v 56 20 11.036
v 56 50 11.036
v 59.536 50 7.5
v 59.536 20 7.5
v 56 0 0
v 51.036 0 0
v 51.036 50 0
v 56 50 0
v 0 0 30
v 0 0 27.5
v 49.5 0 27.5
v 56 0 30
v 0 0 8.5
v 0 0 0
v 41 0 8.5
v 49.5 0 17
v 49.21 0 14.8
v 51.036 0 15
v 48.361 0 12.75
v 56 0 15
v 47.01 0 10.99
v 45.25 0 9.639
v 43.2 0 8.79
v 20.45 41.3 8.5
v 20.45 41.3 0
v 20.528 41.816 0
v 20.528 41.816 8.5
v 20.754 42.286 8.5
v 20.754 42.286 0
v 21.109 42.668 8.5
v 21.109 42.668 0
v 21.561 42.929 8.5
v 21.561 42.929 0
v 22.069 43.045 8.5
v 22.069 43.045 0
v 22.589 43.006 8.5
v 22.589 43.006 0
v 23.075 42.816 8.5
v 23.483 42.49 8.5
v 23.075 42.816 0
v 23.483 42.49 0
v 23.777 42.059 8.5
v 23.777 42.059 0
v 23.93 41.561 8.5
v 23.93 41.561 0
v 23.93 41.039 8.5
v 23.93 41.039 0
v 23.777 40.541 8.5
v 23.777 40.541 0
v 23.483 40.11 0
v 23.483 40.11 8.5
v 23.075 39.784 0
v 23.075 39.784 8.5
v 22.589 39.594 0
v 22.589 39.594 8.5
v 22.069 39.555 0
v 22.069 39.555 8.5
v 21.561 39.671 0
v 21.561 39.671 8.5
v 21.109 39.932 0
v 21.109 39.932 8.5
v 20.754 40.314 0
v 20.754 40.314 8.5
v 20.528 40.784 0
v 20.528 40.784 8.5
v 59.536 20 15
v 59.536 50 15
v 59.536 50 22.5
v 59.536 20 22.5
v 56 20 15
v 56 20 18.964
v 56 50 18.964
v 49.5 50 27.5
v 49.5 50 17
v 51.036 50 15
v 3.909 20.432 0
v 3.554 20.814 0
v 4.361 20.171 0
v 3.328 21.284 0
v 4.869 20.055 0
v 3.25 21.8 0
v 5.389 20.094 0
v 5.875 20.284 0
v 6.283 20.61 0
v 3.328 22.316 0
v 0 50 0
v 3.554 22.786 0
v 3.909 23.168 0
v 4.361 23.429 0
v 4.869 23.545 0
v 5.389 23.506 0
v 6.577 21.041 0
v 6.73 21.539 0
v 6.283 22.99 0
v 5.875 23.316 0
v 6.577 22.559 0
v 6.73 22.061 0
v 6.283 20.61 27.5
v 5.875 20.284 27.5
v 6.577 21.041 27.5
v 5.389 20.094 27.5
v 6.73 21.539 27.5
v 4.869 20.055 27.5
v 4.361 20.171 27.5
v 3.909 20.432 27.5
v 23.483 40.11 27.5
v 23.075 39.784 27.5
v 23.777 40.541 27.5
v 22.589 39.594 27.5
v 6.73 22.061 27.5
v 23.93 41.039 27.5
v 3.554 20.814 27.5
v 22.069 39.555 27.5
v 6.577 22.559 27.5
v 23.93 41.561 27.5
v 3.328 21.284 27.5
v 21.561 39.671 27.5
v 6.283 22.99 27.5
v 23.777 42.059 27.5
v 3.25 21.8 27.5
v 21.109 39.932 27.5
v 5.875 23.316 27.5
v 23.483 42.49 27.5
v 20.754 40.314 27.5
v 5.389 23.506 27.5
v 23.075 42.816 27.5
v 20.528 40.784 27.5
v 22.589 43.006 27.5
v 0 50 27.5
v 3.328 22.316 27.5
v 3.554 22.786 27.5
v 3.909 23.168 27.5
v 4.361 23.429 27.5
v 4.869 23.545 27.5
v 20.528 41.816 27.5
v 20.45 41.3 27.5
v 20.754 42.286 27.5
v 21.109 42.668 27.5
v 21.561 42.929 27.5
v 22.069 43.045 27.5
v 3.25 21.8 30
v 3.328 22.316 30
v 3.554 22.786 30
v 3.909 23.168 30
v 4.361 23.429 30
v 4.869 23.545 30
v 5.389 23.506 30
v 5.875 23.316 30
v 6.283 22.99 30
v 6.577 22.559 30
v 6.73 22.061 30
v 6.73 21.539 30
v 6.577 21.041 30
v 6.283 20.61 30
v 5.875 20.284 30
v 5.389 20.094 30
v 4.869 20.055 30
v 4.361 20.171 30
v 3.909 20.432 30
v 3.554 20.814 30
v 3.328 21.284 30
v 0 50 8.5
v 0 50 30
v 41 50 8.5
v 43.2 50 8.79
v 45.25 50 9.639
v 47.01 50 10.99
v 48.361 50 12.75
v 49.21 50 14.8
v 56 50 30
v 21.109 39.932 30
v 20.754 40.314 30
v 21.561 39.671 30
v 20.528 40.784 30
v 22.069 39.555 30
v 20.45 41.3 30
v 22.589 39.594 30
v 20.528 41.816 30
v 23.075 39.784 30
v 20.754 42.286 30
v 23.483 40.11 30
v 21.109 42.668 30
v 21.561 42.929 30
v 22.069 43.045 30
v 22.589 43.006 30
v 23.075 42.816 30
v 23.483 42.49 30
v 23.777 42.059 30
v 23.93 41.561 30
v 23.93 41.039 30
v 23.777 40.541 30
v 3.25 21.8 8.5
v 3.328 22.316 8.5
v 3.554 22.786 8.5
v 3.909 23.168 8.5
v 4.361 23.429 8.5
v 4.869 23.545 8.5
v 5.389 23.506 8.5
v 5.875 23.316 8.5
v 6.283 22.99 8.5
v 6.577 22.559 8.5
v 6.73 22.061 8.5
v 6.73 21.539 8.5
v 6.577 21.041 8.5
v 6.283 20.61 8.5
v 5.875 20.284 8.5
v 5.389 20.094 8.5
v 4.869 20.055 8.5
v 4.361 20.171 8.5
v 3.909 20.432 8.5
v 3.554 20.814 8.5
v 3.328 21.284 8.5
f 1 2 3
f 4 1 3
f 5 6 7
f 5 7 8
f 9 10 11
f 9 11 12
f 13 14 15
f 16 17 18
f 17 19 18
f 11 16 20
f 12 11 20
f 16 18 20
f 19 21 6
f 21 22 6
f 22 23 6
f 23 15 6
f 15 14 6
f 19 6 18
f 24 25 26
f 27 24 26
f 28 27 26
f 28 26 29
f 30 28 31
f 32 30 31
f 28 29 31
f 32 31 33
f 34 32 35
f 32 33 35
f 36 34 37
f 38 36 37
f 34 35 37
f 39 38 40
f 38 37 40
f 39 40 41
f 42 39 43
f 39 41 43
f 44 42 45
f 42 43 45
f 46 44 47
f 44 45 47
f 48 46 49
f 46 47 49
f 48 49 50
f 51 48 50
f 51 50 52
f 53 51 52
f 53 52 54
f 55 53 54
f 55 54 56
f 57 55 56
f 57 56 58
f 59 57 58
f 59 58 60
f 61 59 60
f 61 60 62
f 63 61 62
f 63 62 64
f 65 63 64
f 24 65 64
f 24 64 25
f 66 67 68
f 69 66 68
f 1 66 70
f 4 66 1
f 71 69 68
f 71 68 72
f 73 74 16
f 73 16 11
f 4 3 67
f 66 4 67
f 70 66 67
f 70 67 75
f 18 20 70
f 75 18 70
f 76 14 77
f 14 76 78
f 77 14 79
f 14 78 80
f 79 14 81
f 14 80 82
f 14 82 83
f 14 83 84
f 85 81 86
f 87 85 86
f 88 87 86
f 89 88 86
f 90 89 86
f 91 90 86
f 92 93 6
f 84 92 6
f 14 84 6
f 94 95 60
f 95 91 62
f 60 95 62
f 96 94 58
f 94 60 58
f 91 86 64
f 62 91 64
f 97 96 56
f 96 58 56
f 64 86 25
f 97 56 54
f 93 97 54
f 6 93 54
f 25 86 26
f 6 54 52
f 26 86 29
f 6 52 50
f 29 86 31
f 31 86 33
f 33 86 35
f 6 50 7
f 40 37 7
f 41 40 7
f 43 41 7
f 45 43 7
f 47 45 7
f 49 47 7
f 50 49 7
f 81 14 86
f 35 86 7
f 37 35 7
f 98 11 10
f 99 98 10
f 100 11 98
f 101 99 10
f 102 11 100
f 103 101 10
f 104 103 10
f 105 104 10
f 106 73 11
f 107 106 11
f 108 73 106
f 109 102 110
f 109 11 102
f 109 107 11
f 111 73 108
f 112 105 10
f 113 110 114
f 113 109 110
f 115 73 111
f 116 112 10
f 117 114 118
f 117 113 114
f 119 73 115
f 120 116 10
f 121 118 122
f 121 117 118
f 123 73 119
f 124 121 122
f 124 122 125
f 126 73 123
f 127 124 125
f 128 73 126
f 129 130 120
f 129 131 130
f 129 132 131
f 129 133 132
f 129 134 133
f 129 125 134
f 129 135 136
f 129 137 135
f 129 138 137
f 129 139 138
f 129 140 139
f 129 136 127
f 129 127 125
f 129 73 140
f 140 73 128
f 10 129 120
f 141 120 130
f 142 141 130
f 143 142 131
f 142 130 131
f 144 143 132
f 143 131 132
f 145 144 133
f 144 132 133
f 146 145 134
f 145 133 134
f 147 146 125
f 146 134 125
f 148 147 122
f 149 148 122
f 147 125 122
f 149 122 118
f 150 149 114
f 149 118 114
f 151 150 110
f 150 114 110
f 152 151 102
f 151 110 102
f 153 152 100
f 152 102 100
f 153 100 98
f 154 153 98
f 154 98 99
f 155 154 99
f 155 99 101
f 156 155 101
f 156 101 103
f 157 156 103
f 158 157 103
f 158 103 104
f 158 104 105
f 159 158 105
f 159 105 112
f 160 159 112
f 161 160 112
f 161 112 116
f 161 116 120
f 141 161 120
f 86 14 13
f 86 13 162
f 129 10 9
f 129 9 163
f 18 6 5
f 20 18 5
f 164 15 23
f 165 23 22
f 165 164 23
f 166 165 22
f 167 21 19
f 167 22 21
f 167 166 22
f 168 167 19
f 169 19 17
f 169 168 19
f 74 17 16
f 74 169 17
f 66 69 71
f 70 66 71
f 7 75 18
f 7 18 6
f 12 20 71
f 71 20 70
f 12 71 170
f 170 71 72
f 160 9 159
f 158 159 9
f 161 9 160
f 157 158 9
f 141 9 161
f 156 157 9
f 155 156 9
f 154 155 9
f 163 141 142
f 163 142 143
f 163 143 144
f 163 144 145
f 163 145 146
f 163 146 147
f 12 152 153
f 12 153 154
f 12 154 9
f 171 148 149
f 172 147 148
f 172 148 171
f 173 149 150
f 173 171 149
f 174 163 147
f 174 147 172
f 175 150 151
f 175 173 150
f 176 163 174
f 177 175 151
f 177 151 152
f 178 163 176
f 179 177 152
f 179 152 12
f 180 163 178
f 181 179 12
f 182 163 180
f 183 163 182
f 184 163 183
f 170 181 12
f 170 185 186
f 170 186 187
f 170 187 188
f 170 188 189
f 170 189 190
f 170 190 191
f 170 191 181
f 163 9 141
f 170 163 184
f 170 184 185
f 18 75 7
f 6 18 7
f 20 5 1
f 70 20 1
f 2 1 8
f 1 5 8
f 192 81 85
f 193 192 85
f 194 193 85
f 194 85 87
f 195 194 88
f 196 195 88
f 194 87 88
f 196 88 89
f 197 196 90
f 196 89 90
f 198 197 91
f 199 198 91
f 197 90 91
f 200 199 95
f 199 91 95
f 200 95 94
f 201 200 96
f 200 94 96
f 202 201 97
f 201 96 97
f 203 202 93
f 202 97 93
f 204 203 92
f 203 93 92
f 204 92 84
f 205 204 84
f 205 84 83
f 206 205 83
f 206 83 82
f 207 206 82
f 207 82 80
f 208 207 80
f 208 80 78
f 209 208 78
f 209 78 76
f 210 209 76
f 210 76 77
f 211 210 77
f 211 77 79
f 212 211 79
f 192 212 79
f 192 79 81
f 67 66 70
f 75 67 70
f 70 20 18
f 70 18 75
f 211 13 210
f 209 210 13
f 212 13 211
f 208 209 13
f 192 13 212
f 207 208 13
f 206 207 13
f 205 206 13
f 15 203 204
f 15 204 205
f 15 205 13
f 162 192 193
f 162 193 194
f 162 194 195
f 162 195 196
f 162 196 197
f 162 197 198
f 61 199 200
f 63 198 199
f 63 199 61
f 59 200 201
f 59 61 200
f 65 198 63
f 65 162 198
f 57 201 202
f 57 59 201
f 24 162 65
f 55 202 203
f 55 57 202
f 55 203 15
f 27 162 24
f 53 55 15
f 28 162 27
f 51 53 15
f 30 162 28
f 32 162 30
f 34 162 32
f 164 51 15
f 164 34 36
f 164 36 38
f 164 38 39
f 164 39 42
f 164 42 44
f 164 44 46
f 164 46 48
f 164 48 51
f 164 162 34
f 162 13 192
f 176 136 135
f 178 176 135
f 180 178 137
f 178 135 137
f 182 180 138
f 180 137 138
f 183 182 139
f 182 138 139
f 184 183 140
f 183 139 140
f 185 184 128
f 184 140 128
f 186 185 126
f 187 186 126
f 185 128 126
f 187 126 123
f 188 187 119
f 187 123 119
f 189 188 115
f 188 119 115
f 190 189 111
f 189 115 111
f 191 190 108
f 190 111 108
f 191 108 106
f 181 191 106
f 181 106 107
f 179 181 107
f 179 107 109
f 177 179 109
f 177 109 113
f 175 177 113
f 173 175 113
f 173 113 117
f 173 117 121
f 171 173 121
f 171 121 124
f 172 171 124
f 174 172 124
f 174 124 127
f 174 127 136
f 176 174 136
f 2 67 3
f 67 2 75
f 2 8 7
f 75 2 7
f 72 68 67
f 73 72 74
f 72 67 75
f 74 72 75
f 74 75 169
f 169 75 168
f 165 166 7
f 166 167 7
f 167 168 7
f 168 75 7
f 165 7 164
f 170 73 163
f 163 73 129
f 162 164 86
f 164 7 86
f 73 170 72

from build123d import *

# Parameters (mm, degrees)
SKETCH1_W              = 56
SKETCH1_H              = 50
BOSS_EXTRUDE1_DEPTH    = 30
SKETCH4_R              = 1.75
CUT_EXTRUDE2_DEPTH     = 81.845531726
CUT_EXTRUDE3_DEPTH     = 81.845531726
BOSS_EXTRUDE2_DEPTH    = 30
SPLIT1_SURFACE_1_BACK  = 84.334
SPLIT1_SURFACE_1_DEPTH = 168.668
SPLIT1_SURFACE_2_BACK  = 84.334
SPLIT1_SURFACE_2_DEPTH = 168.668


with BuildPart() as part:
    # Sketch1 → Boss-Extrude1 (new body)
    with BuildSketch(Plane.XY):
        with Locations((28, 25)):
            Rectangle(SKETCH1_W, SKETCH1_H)
    extrude(amount=BOSS_EXTRUDE1_DEPTH)

    # Sketch4 → Cut-Extrude2 (cut, through all)
    with BuildSketch(Plane(origin=(0, 0, 0), x_dir=(-1, 0, 0), z_dir=(0, 0, -1))):
        with Locations((-5, 21.8)):
            Circle(SKETCH4_R)
        with Locations((-22.2, 41.3)):
            Circle(SKETCH4_R)
    extrude(amount=-CUT_EXTRUDE2_DEPTH, mode=Mode.SUBTRACT)

    # Sketch5 → Cut-Extrude3 (cut, through all)
    with BuildSketch(Plane(origin=(0, 50, 0), x_dir=(1, 0, 0), z_dir=(0, 1, 0))):
        with BuildLine():
            Line((49.5, -17), (49.5, -27.5))
            Line((49.5, -27.5), (0, -27.5))
            Line((0, -27.5), (0, -8.5))
            Line((0, -8.5), (41, -8.5))
            ThreePointArc((41, -8.5), (47.01040764, -10.98959236), (49.5, -17))
        make_face()
    extrude(amount=-CUT_EXTRUDE3_DEPTH, mode=Mode.SUBTRACT)

    # Sketch7 → Boss-Extrude2 (add)
    with BuildSketch(Plane(origin=(0, 50, 0), x_dir=(1, 0, 0), z_dir=(0, 1, 0))):
        Polygon((59.535533906, -7.5), (59.535533906, -22.5), (56, -18.964466094), (55, -18.964466094), (55, -11.035533906), (56, -11.035533906), align=None)
    extrude(amount=-BOSS_EXTRUDE2_DEPTH)


with BuildPart() as body_2:
    # Split1: the piece behind the surface
    add(part.part)
    # Split1 surface: a surface, the sketch's curves swept straight by 168.668 mm
    with BuildLine(Plane(origin=(0, 50, 0), x_dir=(1, 0, 0), z_dir=(0, 1, 0)).offset(-SPLIT1_SURFACE_1_BACK), mode=Mode.PRIVATE) as split1_surface_1_path:
        Line((71.035533906, -15), (51.035533906, -15))
        Line((51.035533906, -15), (51.035533906, 5))
        Line((51.035533906, 5), (71.035533906, 5))
        Line((71.035533906, 5), (71.035533906, -15))
    split1_surface_1 = Shell.extrude(split1_surface_1_path.wire(), (0 * SPLIT1_SURFACE_1_DEPTH, 1 * SPLIT1_SURFACE_1_DEPTH, 0 * SPLIT1_SURFACE_1_DEPTH))
    split(bisect_by=split1_surface_1, keep=Keep.BOTTOM)


with BuildPart() as part_1:
    add(part.part)

    # Split1: split by a surface, the side it looks to stays
    # Split1 surface: a surface, the sketch's curves swept straight by 168.668 mm
    with BuildLine(Plane(origin=(0, 50, 0), x_dir=(1, 0, 0), z_dir=(0, 1, 0)).offset(-SPLIT1_SURFACE_2_BACK), mode=Mode.PRIVATE) as split1_surface_2_path:
        Line((71.035533906, -15), (51.035533906, -15))
        Line((51.035533906, -15), (51.035533906, 5))
        Line((51.035533906, 5), (71.035533906, 5))
        Line((71.035533906, 5), (71.035533906, -15))
    split1_surface_2 = Shell.extrude(split1_surface_2_path.wire(), (0 * SPLIT1_SURFACE_2_DEPTH, 1 * SPLIT1_SURFACE_2_DEPTH, 0 * SPLIT1_SURFACE_2_DEPTH))
    split(bisect_by=split1_surface_2, keep=Keep.TOP)


solid = Compound([body_2.part, part_1.part])
